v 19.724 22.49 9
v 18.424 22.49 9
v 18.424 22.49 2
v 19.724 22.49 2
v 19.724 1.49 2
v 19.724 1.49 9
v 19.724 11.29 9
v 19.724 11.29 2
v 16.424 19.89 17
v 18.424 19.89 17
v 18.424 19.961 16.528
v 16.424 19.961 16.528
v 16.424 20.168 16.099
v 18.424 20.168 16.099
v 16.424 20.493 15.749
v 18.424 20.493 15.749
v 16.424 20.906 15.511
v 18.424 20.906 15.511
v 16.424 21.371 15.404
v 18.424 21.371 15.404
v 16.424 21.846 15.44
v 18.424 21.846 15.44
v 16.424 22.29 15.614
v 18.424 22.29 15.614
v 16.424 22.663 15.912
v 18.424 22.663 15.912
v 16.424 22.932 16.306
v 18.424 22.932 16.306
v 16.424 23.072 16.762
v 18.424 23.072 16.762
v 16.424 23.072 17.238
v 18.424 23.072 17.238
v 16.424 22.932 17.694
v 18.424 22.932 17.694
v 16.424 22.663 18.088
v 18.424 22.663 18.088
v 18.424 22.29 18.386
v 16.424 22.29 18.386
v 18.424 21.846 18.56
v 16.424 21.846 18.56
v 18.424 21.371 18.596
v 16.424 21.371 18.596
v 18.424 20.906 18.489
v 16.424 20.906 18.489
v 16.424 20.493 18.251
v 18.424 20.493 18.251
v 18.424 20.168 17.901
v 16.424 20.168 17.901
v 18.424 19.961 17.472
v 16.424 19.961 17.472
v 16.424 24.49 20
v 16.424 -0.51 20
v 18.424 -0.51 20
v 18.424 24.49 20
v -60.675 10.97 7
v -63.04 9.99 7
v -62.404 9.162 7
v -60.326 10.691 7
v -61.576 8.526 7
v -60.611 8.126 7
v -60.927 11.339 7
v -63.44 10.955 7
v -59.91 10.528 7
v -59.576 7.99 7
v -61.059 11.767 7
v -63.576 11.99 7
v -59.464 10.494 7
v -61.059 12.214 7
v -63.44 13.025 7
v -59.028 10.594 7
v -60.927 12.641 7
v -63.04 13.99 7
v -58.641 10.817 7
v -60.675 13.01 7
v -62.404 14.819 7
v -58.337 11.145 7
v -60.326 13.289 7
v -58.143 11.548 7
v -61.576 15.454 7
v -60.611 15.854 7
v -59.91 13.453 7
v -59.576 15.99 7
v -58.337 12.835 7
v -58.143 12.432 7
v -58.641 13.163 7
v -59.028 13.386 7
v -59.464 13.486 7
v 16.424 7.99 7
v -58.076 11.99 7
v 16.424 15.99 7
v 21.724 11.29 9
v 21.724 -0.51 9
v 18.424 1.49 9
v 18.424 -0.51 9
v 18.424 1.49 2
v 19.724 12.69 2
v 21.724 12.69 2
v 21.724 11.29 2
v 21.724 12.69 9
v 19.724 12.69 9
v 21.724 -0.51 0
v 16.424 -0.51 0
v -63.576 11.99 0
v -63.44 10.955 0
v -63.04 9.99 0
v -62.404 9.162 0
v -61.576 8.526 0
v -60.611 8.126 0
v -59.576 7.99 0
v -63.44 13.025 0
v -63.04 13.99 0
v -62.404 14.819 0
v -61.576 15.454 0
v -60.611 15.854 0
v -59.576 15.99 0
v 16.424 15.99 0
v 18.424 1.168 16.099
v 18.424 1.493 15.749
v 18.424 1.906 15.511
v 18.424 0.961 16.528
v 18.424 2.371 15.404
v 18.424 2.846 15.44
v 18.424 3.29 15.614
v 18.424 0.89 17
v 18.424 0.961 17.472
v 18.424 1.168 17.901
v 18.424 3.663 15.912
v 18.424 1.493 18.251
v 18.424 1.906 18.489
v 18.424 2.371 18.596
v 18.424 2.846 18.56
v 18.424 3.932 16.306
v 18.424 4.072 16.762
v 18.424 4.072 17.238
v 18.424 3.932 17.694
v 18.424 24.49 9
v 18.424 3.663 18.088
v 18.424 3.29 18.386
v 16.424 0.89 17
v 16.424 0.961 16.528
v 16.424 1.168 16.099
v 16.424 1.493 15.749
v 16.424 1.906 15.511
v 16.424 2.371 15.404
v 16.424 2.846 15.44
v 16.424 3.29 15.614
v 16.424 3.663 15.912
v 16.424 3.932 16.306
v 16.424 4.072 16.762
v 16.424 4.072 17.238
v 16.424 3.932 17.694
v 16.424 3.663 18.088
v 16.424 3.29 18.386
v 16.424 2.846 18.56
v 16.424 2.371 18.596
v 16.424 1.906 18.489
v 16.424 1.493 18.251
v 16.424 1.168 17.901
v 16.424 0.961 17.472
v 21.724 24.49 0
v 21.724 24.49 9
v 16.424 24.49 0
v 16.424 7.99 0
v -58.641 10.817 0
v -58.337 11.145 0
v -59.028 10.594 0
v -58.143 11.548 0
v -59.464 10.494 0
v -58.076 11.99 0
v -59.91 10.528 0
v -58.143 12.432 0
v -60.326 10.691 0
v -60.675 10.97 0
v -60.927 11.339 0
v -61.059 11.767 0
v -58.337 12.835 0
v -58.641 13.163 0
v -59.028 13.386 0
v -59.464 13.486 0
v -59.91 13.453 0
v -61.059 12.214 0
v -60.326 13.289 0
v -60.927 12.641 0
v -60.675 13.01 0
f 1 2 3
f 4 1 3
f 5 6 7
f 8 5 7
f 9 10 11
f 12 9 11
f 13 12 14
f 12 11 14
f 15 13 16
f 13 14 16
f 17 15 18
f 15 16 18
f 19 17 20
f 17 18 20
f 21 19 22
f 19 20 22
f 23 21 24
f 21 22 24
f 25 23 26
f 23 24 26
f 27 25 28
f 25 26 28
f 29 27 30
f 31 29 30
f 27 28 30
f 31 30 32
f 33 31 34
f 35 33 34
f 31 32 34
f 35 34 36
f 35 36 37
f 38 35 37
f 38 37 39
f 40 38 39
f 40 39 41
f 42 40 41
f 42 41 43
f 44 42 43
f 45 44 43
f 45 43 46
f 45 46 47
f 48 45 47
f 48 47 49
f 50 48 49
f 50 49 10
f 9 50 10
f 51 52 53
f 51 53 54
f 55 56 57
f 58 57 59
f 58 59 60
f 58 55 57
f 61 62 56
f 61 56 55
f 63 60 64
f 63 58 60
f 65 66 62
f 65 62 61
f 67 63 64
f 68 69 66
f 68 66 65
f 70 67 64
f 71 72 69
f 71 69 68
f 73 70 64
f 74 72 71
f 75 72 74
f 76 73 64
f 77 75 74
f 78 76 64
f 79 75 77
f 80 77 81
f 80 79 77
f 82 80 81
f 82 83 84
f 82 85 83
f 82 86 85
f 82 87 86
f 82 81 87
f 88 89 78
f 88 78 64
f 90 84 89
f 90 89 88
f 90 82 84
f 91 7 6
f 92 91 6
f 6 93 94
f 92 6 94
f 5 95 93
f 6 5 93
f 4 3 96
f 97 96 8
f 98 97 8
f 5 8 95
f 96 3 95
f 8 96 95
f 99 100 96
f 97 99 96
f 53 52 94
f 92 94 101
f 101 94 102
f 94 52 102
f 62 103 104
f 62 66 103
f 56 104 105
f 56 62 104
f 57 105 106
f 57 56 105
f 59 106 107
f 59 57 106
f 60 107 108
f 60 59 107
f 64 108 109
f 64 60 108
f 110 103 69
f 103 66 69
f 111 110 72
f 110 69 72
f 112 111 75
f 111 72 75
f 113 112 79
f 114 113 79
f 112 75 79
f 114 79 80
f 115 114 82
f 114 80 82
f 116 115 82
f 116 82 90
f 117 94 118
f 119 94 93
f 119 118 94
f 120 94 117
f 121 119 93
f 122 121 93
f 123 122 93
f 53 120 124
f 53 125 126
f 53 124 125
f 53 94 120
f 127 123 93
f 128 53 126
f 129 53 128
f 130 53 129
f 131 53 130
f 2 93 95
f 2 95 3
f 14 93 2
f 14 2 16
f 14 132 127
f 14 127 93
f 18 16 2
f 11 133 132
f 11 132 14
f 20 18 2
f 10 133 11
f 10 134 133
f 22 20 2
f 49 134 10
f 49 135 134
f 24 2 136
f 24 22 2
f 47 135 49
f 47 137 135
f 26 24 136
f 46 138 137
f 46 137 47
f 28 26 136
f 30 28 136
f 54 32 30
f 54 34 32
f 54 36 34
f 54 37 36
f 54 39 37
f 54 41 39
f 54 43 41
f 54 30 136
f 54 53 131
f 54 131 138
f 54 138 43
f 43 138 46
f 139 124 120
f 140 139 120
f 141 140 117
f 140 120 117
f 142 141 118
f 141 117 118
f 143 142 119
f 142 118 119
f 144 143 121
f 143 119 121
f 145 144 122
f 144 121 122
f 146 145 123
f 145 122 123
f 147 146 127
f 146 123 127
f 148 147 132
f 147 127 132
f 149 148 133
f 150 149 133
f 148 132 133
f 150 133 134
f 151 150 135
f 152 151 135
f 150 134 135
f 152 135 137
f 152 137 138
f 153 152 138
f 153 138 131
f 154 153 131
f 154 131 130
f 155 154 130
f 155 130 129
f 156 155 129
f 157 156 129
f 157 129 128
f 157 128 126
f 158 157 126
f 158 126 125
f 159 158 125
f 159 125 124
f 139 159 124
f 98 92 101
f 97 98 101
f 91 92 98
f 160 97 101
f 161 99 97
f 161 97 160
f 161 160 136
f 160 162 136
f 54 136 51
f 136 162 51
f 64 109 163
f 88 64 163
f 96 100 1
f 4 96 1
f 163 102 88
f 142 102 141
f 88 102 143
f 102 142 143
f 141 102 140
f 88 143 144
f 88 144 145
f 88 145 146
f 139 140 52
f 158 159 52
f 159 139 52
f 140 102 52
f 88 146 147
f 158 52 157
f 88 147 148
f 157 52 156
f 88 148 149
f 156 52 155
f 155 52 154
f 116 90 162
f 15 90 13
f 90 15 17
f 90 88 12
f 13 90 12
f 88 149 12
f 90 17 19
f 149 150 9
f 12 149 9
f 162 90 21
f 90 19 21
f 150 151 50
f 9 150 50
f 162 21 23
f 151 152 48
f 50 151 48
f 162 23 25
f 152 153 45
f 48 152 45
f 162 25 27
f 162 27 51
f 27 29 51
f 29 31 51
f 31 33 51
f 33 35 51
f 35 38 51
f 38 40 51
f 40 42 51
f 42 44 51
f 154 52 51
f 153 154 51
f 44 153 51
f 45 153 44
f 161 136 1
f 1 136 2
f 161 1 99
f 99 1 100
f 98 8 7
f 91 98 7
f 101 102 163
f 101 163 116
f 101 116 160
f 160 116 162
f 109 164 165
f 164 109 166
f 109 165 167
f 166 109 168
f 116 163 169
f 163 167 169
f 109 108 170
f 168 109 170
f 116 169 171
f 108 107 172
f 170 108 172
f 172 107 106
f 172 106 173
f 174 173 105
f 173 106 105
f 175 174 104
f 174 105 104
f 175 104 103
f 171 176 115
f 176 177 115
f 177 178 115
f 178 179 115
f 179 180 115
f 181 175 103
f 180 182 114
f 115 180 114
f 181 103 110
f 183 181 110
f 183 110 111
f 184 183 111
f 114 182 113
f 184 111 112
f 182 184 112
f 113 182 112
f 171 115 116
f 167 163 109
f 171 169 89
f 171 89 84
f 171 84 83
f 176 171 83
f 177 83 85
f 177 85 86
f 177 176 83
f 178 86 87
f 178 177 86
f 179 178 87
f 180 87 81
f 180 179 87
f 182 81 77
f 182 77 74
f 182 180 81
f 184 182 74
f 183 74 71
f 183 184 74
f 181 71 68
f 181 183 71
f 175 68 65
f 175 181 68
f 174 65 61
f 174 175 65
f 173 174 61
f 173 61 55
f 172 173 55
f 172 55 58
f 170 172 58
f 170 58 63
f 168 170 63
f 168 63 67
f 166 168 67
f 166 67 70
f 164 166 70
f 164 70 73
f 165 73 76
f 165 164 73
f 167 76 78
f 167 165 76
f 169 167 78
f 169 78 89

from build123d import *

# Parameters (mm, degrees)
F0_W     = 80
F0_H     = 8
F0_R     = 1.5
F1_DEPTH = 7
F2_R     = 3.99999
F3_W     = 25
F3_H     = 20
F4_DEPTH = 2
F6_DEPTH = 1.3
F8_DEPTH = 2
F9_D     = 3.2
F9_DEPTH = 6
F9_TIP   = 0.9613769904


# Not quite as in the source:
# - a fillet or chamfer is up to 0.001 mm smaller than in the source, because OpenCascade refuses the exact size


with BuildPart() as f1:
    # F0 (on Top) → F1 (new body)
    with BuildSketch(Plane.XY):
        with Locations((-23.5758614609, 11.990132276)):
            Rectangle(F0_W, F0_H)
        with Locations((-59.5758614609, 11.990132276)):
            Circle(F0_R, mode=Mode.SUBTRACT)
    extrude(amount=F1_DEPTH)

    # F2 (radius 4 in the source; OpenCascade refuses exactly that, so slightly less here)
    f2_edges = [f1.edges().sort_by_distance(p)[0] for p in [
        (-63.575861, 15.990132, 3.5),
        (-63.575861, 7.990132, 3.5),
    ]]
    fillet(f2_edges, radius=F2_R)

    # F3 (on face) → F4 (join)
    with BuildSketch(Plane.YZ.offset(16.4241385391)):
        with Locations((11.990132276, 10)):
            Rectangle(F3_W, F3_H)
    extrude(amount=F4_DEPTH)

    # F5 (on face) → F6 (join)
    with BuildSketch(Plane.YZ.offset(18.4241385391)):
        Polygon((1.490132276, 9), (-0.509867724, 9), (-0.509867724, 0), (24.490132276, 0), (24.490132276, 9), (22.490132276, 9), (22.490132276, 2), (1.490132276, 2), align=None)
    extrude(amount=F6_DEPTH)

    # F7 (on face) → F8 (join)
    with BuildSketch(Plane.YZ.offset(19.7241385391)):
        Polygon((11.290132276, 9), (-0.509867724, 9), (-0.509867724, 0), (24.490132276, 0), (24.490132276, 9), (12.690132276, 9), (12.690132276, 2), (11.290132276, 2), align=None)
    extrude(amount=F8_DEPTH)

    # F9
    with Locations(Plane(origin=(16.4241385391, 0, 0), x_dir=(0, 1, 0), z_dir=(-1, 0, 0))):
        with Locations((2.490132276, -17), (21.490132276, -17)):
            Hole(F9_D / 2, depth=F9_DEPTH)
            with Locations((0, 0, -(F9_DEPTH + F9_TIP / 2))):  # 118° drill point
                Cone(0, F9_D / 2, F9_TIP, mode=Mode.SUBTRACT)


solid = f1.part
